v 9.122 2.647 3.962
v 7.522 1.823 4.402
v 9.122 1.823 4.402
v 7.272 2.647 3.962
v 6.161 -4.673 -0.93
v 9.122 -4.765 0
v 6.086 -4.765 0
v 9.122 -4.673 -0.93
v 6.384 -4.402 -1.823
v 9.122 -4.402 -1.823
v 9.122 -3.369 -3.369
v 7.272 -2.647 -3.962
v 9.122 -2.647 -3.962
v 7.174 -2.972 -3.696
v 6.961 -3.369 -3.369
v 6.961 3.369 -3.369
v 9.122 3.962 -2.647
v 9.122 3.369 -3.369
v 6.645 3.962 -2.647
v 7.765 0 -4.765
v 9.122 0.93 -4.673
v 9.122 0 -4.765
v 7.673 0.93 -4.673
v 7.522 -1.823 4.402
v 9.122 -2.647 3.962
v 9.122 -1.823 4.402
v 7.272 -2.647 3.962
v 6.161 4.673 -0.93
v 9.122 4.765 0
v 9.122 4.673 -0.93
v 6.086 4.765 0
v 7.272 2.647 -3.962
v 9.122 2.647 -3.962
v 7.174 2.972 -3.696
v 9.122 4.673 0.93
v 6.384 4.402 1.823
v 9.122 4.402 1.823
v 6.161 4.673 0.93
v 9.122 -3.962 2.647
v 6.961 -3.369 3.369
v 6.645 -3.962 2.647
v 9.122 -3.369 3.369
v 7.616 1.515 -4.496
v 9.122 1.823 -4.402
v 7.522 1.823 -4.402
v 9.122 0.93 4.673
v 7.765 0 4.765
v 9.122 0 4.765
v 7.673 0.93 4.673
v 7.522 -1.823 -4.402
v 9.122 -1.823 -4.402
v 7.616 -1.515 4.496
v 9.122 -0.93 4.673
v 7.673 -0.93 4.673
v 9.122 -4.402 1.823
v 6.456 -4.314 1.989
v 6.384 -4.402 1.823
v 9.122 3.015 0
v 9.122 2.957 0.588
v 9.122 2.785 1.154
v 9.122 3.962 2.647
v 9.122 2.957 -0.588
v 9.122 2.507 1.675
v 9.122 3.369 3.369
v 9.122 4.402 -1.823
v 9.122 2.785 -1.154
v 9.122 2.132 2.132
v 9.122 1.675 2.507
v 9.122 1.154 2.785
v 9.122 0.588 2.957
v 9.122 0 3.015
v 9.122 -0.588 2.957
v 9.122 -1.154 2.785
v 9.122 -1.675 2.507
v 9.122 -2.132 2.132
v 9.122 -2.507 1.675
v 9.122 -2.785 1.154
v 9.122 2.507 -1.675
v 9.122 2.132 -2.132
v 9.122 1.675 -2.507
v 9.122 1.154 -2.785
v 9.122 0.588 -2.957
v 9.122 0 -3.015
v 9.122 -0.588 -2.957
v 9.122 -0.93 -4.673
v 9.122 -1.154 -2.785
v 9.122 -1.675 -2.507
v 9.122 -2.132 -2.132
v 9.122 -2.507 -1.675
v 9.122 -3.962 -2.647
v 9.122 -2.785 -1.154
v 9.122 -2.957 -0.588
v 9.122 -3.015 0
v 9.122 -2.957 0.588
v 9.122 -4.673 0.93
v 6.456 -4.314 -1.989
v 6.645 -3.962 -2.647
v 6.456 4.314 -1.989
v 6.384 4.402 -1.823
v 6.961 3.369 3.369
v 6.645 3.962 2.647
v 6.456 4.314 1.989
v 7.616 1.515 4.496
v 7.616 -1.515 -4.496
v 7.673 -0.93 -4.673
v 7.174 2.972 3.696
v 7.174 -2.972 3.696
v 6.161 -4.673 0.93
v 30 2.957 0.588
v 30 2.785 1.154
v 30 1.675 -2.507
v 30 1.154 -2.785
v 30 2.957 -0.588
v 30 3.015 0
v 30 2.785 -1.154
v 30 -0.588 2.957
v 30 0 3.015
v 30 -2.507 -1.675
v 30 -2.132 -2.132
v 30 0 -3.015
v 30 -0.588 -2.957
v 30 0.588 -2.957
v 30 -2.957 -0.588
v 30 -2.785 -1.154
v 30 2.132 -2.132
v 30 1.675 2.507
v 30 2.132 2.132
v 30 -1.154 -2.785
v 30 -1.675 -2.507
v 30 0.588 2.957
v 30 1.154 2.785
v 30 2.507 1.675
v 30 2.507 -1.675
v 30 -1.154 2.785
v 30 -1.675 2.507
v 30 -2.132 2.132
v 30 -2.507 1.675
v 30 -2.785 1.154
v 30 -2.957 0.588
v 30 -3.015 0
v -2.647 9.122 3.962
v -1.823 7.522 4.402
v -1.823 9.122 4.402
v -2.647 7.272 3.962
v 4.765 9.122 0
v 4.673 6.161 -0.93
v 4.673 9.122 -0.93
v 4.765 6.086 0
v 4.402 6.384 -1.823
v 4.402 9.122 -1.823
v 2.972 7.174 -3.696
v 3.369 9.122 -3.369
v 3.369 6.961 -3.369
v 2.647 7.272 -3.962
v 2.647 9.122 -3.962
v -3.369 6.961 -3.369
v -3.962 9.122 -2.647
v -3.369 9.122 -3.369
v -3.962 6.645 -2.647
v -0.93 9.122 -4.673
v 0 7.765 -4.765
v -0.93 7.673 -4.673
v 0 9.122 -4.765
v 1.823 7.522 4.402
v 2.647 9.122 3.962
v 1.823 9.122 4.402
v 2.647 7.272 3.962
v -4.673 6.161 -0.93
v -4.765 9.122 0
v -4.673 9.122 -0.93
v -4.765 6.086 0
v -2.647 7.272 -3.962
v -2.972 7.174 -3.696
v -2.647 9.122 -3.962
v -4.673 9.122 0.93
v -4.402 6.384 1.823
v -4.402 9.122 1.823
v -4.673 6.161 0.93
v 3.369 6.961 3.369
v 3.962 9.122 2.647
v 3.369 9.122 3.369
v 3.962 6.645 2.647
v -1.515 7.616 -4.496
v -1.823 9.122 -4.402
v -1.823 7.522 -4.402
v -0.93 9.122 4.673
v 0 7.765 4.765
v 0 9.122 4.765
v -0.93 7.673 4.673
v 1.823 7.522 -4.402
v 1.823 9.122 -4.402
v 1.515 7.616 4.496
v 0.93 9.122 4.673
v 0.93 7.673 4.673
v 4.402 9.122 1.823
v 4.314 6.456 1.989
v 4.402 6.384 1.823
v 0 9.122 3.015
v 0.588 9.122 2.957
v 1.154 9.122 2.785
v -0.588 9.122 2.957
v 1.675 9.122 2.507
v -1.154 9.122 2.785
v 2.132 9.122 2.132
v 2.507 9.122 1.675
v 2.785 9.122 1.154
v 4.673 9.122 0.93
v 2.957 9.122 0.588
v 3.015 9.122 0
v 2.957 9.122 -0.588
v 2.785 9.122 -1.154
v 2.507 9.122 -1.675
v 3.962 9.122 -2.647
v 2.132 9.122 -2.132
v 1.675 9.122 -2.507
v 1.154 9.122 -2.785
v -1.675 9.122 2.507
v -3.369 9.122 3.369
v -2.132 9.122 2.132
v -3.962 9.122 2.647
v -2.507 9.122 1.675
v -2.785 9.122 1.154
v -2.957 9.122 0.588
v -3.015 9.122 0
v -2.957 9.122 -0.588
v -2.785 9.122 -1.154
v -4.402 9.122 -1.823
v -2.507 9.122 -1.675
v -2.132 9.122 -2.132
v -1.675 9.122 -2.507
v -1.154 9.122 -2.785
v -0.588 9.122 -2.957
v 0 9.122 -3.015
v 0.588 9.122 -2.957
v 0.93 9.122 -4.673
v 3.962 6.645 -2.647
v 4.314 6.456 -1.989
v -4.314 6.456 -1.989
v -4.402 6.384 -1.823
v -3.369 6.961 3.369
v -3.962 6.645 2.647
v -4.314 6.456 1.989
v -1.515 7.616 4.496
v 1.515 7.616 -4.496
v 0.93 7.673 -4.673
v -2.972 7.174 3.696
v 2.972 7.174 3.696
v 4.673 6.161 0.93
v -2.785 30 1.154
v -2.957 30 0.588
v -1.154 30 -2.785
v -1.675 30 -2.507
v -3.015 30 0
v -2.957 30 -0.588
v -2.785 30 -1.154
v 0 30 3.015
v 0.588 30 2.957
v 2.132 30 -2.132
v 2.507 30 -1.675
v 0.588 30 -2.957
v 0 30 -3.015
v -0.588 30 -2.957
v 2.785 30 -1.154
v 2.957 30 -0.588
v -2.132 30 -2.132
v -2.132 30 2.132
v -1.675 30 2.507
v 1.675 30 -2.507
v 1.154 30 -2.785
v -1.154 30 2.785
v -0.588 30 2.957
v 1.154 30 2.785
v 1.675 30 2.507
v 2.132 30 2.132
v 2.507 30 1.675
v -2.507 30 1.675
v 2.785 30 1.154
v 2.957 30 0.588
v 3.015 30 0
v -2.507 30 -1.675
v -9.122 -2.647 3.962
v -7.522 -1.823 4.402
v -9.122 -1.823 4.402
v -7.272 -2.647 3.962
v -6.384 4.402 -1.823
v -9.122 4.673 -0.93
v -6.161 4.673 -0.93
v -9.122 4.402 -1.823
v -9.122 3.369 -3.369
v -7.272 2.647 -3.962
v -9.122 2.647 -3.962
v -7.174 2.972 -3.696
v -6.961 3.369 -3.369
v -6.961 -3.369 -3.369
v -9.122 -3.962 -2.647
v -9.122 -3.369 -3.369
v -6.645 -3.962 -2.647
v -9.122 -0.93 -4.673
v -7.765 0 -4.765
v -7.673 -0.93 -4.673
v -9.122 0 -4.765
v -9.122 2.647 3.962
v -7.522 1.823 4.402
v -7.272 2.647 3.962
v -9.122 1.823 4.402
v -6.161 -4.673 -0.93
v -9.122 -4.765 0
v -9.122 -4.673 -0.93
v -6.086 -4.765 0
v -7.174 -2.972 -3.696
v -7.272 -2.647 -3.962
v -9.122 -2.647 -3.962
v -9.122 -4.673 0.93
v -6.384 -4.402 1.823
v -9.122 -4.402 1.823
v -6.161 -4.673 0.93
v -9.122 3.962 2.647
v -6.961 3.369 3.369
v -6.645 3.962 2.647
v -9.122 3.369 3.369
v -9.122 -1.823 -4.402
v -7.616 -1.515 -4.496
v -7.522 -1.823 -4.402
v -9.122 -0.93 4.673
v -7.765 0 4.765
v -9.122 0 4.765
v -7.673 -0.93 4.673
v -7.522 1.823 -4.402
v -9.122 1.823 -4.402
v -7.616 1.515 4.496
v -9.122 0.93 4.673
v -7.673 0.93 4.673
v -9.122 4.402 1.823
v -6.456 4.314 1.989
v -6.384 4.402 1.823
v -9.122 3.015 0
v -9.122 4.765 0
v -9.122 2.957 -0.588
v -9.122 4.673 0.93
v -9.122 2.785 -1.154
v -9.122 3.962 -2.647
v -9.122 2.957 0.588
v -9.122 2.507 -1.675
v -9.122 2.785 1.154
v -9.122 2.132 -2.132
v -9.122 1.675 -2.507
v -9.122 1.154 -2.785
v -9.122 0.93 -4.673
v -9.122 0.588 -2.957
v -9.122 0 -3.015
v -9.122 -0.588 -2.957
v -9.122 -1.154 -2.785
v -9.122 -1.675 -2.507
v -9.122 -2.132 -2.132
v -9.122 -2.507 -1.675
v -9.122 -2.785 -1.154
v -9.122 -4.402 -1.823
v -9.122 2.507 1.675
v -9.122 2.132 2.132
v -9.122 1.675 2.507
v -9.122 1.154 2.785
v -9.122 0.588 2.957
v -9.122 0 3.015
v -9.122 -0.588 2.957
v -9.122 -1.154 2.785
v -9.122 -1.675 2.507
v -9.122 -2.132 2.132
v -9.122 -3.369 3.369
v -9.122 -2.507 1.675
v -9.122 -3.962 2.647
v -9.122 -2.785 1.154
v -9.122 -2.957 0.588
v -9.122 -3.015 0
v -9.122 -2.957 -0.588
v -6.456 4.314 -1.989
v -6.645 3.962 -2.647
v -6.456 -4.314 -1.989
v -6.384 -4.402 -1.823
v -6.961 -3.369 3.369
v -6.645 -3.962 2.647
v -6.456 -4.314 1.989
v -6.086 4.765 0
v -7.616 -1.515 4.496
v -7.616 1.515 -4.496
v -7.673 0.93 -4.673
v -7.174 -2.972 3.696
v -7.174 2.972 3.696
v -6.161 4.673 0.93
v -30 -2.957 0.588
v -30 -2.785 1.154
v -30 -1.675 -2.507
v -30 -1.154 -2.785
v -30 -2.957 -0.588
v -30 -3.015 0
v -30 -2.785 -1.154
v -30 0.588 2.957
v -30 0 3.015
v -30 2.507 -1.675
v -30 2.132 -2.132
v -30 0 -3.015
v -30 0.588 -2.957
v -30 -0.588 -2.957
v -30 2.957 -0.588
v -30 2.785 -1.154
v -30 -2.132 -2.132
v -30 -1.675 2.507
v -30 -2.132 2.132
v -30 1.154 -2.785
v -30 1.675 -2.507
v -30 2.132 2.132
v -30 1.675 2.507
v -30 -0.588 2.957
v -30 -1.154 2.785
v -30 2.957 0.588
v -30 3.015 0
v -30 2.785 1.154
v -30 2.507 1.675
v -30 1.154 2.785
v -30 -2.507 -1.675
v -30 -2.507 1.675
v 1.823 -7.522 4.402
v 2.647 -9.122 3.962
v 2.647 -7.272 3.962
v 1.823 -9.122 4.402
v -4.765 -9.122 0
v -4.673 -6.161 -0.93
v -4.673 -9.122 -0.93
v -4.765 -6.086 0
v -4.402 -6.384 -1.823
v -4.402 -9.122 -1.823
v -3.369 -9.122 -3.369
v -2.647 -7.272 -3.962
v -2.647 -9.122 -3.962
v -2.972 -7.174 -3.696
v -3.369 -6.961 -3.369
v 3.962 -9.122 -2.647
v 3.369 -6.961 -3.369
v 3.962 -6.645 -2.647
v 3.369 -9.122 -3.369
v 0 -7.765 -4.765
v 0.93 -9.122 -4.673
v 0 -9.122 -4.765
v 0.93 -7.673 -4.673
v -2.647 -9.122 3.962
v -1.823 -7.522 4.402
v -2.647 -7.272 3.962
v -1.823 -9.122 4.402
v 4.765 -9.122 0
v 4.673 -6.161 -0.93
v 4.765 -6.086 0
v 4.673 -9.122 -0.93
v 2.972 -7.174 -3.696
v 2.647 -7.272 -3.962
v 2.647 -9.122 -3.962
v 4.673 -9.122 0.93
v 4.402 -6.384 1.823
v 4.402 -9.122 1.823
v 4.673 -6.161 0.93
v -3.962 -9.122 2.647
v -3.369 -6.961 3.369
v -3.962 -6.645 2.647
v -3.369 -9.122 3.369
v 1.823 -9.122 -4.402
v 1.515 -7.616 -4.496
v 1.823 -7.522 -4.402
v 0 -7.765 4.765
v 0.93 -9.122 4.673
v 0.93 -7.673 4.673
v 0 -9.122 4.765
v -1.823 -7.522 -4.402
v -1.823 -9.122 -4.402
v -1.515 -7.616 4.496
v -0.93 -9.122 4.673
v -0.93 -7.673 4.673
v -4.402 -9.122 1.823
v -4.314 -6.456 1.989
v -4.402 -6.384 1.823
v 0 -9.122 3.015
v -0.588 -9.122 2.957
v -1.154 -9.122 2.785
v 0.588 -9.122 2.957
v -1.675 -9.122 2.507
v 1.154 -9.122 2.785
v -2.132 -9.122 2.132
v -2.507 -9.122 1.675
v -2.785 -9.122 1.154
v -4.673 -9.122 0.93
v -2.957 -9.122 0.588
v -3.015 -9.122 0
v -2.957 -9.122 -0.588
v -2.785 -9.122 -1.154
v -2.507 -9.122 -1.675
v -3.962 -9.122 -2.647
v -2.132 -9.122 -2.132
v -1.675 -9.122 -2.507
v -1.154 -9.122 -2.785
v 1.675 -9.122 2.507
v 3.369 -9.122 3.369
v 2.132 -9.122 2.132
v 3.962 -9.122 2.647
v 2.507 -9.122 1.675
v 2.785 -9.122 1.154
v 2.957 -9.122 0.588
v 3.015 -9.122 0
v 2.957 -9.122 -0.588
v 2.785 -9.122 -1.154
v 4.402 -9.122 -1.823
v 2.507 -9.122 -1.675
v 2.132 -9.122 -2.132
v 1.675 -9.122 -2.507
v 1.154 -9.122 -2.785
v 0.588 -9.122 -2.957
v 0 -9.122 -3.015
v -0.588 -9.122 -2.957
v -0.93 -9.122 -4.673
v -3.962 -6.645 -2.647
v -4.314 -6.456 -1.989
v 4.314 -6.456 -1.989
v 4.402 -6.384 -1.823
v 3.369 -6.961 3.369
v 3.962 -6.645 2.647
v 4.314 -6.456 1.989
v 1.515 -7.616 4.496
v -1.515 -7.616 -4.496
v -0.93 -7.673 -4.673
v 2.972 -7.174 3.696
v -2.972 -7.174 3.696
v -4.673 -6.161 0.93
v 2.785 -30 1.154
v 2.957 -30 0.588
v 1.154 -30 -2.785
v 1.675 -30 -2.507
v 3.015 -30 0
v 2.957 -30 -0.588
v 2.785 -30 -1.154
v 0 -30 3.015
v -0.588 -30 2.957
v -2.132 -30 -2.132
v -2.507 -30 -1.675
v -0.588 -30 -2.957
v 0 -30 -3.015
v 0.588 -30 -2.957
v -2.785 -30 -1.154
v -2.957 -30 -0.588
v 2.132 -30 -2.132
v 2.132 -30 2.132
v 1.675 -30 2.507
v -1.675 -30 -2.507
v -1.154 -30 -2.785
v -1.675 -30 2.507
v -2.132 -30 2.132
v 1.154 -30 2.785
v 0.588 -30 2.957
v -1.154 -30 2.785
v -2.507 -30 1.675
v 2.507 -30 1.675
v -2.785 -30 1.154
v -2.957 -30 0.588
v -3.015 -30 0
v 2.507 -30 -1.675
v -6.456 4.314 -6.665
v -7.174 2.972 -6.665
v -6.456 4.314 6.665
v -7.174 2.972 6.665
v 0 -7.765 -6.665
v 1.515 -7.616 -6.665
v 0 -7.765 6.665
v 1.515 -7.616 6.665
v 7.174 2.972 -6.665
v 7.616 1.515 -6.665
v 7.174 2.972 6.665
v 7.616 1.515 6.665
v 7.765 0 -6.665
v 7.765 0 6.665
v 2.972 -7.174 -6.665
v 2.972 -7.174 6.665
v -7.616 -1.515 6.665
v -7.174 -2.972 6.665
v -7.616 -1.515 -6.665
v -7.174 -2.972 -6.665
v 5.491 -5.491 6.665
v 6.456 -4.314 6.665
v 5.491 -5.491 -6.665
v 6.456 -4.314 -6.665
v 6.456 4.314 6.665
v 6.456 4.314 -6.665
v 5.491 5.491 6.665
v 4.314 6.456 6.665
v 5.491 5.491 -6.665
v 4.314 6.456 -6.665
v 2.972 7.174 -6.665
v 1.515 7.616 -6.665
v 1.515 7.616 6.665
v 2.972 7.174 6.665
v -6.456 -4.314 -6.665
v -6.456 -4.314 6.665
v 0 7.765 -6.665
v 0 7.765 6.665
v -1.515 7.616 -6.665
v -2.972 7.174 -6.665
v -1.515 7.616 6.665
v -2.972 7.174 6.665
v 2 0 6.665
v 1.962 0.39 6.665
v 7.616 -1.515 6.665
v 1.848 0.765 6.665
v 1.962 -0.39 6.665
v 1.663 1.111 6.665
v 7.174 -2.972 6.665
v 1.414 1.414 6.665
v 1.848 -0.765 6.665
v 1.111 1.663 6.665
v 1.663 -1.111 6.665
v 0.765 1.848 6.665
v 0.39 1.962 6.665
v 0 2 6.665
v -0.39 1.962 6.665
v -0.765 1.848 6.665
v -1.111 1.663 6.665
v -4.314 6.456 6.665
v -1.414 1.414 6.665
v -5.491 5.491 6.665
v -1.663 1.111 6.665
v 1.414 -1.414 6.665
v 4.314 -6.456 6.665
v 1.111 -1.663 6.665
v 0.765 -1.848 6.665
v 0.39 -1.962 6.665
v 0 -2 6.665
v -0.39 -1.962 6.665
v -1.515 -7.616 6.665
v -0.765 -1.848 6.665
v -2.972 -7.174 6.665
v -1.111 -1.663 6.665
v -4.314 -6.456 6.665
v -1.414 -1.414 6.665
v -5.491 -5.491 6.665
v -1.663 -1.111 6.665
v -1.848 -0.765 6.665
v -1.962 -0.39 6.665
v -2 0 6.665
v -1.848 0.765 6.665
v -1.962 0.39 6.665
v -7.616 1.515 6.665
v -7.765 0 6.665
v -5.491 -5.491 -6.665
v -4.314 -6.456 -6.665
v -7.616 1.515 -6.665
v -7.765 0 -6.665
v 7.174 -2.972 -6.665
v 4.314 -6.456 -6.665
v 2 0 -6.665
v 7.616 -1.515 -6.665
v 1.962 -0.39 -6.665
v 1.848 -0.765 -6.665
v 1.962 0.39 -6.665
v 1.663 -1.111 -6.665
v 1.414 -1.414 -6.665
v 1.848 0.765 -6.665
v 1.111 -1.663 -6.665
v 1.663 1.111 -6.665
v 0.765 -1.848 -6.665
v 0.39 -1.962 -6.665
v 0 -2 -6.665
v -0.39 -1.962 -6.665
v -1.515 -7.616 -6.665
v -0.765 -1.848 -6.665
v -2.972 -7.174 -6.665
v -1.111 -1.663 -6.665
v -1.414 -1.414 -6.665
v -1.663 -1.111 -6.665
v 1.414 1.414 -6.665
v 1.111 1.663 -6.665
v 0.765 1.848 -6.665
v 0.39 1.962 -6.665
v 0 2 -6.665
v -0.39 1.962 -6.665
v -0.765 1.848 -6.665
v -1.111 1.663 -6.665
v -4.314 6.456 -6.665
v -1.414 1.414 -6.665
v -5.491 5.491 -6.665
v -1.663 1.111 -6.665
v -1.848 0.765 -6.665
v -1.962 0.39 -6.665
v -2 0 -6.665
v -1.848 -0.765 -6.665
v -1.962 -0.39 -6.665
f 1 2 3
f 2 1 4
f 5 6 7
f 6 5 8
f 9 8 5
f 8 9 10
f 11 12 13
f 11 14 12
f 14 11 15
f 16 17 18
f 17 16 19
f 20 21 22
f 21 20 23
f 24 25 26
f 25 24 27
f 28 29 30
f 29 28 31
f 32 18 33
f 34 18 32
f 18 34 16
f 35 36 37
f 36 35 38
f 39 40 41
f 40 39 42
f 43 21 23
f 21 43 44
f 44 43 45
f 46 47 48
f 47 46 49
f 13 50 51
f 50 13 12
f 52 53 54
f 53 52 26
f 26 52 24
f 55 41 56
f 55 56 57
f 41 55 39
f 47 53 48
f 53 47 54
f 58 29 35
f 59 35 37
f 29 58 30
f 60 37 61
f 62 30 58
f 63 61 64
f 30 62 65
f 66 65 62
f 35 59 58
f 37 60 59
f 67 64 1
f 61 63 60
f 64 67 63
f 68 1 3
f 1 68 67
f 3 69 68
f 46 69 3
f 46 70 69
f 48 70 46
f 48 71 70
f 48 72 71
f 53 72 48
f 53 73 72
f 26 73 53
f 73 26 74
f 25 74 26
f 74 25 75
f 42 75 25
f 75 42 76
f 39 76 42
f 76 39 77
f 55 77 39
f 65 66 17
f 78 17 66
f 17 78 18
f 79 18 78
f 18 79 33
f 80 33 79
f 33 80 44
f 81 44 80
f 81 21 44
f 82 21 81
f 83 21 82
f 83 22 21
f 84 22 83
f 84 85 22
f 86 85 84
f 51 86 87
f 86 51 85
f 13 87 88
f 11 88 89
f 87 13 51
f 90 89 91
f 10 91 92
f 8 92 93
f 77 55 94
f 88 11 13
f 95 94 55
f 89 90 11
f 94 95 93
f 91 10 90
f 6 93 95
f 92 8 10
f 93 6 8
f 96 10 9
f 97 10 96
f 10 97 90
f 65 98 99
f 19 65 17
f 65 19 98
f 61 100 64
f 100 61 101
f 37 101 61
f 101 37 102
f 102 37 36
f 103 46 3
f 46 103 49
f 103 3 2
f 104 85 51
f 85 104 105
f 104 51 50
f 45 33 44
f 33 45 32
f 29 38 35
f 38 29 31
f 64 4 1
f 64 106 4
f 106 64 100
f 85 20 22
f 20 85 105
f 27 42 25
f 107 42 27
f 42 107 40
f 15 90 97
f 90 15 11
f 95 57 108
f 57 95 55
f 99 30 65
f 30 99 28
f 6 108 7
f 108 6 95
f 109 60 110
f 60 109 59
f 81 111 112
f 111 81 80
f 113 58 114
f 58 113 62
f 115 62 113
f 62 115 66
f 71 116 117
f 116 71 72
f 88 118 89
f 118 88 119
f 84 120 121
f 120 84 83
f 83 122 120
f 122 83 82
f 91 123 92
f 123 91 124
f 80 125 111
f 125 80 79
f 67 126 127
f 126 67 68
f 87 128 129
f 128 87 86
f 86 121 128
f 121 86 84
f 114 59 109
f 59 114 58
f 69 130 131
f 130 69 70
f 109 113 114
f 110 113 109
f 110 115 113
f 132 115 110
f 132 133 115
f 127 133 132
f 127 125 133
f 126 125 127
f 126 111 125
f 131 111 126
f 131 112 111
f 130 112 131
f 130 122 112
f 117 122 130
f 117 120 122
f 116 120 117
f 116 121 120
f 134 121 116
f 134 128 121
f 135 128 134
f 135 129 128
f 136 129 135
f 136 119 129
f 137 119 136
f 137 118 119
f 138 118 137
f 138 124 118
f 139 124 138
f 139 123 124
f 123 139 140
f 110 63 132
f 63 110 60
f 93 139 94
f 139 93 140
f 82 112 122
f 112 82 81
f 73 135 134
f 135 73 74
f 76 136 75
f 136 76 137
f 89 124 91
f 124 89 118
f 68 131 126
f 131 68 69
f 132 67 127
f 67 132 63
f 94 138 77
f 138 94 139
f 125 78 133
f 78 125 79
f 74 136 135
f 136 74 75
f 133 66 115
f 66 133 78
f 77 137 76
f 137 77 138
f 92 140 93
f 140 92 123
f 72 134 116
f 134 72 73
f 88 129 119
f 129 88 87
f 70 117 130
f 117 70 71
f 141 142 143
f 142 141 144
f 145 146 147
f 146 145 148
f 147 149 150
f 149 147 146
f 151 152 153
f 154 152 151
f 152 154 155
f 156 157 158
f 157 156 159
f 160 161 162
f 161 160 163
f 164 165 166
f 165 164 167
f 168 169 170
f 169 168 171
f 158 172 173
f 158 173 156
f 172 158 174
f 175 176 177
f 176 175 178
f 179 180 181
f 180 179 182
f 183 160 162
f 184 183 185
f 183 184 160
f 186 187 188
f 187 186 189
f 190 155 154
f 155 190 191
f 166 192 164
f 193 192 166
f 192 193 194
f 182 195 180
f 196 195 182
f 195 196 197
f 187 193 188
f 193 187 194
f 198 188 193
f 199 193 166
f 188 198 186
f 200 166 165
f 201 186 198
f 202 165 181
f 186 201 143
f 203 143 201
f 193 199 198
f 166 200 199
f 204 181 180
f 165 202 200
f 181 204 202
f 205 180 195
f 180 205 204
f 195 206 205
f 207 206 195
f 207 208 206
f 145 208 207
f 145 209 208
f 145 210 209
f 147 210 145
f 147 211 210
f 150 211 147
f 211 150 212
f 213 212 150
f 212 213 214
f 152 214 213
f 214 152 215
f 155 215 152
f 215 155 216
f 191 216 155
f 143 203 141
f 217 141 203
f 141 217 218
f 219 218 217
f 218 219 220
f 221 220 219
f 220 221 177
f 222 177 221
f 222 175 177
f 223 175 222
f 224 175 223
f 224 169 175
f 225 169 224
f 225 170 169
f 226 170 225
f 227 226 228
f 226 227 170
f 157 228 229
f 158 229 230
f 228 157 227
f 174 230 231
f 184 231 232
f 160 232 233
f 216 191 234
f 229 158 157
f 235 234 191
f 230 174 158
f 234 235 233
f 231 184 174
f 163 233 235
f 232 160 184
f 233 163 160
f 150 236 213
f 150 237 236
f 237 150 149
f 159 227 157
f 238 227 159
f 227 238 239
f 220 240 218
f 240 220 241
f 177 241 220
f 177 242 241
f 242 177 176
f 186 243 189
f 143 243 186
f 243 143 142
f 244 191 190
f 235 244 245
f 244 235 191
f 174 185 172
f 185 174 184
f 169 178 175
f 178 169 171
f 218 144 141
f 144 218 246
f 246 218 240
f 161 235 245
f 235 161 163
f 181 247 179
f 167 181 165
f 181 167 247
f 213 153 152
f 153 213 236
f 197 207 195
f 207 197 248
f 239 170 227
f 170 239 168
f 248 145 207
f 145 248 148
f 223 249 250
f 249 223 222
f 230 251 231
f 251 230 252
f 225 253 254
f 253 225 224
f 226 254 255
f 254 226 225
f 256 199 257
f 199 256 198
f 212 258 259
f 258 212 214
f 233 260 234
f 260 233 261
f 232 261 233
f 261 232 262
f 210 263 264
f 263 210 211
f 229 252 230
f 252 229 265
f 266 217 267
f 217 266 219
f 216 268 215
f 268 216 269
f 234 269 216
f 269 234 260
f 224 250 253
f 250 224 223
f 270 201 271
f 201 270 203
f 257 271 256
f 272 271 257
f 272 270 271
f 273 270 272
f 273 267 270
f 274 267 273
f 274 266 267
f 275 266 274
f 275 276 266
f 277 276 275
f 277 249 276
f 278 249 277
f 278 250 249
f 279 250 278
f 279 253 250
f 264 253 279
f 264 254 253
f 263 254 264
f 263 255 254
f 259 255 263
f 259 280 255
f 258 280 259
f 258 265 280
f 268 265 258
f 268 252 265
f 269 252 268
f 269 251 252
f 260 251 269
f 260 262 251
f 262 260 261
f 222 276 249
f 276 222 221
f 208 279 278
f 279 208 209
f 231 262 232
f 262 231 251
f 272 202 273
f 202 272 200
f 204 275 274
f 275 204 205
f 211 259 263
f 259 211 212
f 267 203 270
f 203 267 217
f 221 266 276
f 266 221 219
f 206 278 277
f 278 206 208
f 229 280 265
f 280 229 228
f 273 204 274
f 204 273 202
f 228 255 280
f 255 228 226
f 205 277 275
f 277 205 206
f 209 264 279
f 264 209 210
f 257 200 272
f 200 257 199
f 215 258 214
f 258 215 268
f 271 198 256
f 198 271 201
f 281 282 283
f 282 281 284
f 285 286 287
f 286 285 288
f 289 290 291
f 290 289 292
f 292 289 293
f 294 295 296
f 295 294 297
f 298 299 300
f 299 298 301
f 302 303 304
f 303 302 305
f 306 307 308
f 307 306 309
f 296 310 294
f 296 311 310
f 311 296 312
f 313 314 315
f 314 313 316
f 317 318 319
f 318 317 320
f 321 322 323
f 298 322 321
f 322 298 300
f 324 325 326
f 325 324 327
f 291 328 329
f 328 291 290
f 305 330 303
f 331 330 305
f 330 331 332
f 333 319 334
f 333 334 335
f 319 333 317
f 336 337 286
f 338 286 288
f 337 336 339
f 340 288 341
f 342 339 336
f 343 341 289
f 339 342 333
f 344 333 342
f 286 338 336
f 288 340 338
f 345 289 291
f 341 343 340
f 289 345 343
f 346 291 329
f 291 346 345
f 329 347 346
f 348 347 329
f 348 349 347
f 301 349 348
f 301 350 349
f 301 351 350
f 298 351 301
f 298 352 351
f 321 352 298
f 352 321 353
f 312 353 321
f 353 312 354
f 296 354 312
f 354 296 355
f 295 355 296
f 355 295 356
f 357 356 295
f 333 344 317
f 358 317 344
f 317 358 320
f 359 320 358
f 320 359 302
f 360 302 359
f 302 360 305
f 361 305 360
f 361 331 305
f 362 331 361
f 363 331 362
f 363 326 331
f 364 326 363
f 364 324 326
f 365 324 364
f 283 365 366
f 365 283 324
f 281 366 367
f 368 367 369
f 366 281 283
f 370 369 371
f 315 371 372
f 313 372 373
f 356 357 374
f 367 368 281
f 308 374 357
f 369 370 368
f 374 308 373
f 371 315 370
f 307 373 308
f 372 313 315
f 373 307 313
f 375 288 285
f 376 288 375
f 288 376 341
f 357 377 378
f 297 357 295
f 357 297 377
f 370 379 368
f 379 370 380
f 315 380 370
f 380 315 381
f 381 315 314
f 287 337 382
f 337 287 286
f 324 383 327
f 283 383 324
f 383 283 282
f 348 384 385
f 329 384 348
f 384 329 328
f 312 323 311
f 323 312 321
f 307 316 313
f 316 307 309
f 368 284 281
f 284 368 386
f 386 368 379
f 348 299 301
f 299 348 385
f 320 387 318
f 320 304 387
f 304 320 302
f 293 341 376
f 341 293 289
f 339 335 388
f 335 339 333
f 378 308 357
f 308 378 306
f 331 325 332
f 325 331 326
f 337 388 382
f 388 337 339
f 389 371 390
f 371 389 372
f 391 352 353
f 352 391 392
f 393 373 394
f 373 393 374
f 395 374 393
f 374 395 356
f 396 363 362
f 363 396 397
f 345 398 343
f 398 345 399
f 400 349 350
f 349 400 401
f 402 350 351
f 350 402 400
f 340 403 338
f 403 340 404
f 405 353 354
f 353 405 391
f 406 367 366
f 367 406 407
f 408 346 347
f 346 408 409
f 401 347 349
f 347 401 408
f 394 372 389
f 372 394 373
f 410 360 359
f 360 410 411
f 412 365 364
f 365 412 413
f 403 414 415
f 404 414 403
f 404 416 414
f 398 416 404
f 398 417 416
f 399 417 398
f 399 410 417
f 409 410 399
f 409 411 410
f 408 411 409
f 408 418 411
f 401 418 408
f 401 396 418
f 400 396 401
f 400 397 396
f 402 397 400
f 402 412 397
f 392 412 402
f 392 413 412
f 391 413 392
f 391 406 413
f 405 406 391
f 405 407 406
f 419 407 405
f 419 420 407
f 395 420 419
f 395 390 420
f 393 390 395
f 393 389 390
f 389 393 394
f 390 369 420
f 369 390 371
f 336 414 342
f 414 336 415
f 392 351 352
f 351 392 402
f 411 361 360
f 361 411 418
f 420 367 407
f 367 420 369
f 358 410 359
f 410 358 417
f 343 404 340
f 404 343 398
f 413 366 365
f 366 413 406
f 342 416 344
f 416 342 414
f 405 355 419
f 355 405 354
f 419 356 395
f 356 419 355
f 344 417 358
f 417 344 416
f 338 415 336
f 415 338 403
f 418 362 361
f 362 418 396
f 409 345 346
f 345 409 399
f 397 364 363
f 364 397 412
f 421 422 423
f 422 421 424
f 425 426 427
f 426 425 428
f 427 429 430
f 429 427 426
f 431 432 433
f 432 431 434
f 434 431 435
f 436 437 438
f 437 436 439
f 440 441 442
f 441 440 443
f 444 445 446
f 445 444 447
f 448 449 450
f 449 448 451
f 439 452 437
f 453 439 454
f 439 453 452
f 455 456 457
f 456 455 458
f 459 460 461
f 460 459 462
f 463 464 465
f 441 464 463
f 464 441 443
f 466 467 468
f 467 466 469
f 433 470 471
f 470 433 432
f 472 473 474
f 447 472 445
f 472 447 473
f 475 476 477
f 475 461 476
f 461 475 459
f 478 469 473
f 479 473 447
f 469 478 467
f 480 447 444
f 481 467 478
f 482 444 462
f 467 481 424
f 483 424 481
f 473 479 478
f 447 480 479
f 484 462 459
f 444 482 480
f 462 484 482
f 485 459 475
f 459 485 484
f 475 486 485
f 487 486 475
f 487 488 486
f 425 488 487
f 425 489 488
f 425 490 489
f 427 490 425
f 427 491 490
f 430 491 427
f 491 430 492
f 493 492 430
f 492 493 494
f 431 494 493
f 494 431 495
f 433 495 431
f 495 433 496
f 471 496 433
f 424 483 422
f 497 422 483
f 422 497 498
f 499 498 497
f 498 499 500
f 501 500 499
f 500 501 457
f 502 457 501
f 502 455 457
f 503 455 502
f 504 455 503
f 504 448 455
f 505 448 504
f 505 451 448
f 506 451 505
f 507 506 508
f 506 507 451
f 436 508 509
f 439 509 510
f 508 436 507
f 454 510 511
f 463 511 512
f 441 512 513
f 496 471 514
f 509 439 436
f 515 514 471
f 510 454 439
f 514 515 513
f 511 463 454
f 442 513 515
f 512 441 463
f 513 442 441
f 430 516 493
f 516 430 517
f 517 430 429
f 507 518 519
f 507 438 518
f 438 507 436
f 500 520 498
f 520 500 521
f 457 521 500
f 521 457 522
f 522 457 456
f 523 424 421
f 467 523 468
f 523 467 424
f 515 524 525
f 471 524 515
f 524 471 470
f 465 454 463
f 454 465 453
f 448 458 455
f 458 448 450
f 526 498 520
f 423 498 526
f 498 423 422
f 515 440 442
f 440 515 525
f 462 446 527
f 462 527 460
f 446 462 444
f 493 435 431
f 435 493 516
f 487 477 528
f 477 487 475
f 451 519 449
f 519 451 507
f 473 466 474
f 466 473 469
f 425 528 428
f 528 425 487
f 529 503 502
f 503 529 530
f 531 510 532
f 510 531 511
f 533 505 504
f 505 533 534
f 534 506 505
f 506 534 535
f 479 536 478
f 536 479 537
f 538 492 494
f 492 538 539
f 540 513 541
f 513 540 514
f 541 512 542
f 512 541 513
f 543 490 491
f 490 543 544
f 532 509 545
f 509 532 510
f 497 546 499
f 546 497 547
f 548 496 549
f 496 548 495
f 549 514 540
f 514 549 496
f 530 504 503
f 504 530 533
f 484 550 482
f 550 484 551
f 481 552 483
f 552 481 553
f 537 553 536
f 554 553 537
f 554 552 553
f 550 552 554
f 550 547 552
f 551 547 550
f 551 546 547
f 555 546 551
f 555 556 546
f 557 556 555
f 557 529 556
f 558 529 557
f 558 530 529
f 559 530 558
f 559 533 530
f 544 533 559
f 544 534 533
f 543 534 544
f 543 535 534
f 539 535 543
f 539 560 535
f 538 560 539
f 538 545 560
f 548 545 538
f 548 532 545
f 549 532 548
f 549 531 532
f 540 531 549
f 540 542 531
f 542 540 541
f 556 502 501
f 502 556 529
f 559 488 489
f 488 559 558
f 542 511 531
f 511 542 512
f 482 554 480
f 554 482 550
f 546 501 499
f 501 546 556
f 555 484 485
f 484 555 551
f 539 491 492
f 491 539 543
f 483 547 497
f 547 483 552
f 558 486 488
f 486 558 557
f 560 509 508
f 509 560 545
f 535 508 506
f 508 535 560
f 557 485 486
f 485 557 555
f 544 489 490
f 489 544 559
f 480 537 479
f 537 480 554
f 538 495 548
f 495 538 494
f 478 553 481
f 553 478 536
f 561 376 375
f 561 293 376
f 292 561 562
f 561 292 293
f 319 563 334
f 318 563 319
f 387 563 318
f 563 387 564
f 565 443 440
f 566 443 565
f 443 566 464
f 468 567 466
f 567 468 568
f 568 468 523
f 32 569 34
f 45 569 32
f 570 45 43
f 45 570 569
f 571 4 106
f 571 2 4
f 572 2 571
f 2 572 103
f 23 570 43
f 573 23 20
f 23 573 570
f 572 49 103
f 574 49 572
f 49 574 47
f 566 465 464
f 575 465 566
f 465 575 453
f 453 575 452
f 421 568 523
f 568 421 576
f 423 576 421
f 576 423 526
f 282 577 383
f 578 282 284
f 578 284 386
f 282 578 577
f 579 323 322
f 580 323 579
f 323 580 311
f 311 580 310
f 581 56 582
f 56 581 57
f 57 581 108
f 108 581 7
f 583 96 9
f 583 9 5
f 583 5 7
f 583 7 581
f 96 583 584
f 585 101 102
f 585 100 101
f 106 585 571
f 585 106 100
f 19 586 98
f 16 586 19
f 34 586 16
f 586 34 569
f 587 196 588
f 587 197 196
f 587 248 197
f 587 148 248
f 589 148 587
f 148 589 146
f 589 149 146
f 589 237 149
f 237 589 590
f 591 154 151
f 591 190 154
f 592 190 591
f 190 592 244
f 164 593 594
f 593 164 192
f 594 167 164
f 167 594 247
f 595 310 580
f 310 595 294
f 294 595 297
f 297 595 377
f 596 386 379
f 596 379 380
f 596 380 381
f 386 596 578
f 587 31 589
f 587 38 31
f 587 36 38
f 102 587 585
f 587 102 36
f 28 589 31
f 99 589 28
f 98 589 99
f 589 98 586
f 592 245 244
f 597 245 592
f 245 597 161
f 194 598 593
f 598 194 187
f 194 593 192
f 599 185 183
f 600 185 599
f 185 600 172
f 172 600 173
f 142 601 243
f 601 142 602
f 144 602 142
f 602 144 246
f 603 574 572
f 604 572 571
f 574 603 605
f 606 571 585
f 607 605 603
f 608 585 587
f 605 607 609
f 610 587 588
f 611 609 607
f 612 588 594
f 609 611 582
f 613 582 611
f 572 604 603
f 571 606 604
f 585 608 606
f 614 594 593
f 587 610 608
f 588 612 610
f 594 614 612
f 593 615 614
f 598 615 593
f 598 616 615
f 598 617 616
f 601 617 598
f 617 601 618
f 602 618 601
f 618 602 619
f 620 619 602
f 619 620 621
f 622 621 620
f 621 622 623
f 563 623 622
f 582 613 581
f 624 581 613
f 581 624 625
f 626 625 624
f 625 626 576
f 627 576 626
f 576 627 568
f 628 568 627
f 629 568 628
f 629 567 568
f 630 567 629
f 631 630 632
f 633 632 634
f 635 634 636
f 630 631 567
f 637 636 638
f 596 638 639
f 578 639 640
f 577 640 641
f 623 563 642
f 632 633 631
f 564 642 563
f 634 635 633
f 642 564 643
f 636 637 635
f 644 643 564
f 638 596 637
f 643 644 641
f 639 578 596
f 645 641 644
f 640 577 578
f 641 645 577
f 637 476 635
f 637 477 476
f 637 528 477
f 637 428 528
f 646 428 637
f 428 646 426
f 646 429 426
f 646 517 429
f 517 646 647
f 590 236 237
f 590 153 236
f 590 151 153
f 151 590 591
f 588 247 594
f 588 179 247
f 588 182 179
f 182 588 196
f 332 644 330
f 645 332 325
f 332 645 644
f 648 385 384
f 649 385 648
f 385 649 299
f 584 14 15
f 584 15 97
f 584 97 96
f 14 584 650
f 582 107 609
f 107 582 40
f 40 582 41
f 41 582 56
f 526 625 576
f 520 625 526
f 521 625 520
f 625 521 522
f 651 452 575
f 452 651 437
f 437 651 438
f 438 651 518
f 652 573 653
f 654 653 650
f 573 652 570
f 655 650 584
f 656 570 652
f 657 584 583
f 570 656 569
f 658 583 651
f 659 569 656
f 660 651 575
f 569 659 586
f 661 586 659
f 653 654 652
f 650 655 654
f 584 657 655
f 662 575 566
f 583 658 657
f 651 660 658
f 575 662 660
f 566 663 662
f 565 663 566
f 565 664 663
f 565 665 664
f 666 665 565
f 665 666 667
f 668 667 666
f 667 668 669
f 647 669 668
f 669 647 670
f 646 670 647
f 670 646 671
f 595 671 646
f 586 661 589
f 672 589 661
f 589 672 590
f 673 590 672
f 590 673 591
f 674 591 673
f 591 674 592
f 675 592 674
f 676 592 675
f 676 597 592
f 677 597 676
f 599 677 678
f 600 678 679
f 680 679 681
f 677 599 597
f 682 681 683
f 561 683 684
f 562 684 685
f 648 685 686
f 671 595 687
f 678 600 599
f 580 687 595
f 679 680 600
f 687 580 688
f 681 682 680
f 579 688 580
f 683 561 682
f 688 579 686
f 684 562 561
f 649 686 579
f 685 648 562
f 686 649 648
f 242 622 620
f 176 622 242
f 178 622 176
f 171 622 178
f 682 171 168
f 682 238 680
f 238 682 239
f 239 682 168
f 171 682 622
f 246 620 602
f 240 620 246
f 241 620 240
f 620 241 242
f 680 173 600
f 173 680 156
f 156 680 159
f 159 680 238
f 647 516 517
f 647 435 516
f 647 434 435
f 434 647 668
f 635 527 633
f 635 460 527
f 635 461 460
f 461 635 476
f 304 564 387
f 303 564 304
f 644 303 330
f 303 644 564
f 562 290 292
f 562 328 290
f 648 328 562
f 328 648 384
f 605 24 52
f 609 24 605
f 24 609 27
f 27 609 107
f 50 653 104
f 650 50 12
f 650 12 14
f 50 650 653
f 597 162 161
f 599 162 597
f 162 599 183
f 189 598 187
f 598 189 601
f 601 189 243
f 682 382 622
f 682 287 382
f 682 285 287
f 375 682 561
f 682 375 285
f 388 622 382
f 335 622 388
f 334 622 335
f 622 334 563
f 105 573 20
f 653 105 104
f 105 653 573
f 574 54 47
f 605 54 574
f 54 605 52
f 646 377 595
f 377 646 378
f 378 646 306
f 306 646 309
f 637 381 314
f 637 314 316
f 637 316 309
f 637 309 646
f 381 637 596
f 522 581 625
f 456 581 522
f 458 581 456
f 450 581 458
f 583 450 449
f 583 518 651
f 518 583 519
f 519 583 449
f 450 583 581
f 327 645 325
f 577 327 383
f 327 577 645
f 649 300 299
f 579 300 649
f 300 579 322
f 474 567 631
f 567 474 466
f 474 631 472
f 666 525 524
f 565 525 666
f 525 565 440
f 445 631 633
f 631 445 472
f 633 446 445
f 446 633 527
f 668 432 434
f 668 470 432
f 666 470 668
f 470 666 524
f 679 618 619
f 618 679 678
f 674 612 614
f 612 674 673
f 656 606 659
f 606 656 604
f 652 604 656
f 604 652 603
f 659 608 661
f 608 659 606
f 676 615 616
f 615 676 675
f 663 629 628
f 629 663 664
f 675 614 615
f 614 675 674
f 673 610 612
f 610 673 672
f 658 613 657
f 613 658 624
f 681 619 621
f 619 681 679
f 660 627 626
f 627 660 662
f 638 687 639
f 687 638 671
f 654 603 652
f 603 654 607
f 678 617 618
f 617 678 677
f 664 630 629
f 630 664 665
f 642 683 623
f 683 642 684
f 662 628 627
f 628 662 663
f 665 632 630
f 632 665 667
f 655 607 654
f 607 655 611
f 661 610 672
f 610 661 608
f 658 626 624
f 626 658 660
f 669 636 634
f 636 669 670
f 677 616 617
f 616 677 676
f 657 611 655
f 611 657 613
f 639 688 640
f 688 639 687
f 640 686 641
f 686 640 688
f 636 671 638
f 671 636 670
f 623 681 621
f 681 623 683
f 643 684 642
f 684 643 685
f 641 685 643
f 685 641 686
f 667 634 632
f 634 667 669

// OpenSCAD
$fn = 32;

// ----------------------------------------------------------------------
// Cardan cross: 60 mm span, 9.53 mm trunnions
// ----------------------------------------------------------------------

// --- parameters (mm) ---
journal_d = 9.53;         // trunnion diameter
arm_len = 30;             // trunnion length from the centre
step_r = 3.24;            // step position from the centre
step_d = 6.03;            // journal diameter after the step
hub_d = 15.53;            // hub diameter
hub_h = 13.33;            // hub height
bore_d = 4;               // hub bore

difference() {
  union() {
    /* hub along the joint axis */
    cylinder(h = hub_h, d = hub_d, center = true);
    for (a = [0 : 90 : 270]) rotate([0, 0, a]) {
      /* trunnion, sunk into the hub */
      translate([hub_d / 4, 0, 0]) rotate([0, 90, 0]) cylinder(h = step_r + 2, d = journal_d);
      /* stepped journal out to the tip */
      translate([step_r - 0.5, 0, 0]) rotate([0, 90, 0]) cylinder(h = arm_len + 0.5 - step_r, d = step_d);
    }
  }
  /* lubrication bore through the hub, 2.5 mm clear on both sides */
  translate([0, 0, -hub_h / 2 - 2.5]) cylinder(h = hub_h + 5, d = bore_d);
}
